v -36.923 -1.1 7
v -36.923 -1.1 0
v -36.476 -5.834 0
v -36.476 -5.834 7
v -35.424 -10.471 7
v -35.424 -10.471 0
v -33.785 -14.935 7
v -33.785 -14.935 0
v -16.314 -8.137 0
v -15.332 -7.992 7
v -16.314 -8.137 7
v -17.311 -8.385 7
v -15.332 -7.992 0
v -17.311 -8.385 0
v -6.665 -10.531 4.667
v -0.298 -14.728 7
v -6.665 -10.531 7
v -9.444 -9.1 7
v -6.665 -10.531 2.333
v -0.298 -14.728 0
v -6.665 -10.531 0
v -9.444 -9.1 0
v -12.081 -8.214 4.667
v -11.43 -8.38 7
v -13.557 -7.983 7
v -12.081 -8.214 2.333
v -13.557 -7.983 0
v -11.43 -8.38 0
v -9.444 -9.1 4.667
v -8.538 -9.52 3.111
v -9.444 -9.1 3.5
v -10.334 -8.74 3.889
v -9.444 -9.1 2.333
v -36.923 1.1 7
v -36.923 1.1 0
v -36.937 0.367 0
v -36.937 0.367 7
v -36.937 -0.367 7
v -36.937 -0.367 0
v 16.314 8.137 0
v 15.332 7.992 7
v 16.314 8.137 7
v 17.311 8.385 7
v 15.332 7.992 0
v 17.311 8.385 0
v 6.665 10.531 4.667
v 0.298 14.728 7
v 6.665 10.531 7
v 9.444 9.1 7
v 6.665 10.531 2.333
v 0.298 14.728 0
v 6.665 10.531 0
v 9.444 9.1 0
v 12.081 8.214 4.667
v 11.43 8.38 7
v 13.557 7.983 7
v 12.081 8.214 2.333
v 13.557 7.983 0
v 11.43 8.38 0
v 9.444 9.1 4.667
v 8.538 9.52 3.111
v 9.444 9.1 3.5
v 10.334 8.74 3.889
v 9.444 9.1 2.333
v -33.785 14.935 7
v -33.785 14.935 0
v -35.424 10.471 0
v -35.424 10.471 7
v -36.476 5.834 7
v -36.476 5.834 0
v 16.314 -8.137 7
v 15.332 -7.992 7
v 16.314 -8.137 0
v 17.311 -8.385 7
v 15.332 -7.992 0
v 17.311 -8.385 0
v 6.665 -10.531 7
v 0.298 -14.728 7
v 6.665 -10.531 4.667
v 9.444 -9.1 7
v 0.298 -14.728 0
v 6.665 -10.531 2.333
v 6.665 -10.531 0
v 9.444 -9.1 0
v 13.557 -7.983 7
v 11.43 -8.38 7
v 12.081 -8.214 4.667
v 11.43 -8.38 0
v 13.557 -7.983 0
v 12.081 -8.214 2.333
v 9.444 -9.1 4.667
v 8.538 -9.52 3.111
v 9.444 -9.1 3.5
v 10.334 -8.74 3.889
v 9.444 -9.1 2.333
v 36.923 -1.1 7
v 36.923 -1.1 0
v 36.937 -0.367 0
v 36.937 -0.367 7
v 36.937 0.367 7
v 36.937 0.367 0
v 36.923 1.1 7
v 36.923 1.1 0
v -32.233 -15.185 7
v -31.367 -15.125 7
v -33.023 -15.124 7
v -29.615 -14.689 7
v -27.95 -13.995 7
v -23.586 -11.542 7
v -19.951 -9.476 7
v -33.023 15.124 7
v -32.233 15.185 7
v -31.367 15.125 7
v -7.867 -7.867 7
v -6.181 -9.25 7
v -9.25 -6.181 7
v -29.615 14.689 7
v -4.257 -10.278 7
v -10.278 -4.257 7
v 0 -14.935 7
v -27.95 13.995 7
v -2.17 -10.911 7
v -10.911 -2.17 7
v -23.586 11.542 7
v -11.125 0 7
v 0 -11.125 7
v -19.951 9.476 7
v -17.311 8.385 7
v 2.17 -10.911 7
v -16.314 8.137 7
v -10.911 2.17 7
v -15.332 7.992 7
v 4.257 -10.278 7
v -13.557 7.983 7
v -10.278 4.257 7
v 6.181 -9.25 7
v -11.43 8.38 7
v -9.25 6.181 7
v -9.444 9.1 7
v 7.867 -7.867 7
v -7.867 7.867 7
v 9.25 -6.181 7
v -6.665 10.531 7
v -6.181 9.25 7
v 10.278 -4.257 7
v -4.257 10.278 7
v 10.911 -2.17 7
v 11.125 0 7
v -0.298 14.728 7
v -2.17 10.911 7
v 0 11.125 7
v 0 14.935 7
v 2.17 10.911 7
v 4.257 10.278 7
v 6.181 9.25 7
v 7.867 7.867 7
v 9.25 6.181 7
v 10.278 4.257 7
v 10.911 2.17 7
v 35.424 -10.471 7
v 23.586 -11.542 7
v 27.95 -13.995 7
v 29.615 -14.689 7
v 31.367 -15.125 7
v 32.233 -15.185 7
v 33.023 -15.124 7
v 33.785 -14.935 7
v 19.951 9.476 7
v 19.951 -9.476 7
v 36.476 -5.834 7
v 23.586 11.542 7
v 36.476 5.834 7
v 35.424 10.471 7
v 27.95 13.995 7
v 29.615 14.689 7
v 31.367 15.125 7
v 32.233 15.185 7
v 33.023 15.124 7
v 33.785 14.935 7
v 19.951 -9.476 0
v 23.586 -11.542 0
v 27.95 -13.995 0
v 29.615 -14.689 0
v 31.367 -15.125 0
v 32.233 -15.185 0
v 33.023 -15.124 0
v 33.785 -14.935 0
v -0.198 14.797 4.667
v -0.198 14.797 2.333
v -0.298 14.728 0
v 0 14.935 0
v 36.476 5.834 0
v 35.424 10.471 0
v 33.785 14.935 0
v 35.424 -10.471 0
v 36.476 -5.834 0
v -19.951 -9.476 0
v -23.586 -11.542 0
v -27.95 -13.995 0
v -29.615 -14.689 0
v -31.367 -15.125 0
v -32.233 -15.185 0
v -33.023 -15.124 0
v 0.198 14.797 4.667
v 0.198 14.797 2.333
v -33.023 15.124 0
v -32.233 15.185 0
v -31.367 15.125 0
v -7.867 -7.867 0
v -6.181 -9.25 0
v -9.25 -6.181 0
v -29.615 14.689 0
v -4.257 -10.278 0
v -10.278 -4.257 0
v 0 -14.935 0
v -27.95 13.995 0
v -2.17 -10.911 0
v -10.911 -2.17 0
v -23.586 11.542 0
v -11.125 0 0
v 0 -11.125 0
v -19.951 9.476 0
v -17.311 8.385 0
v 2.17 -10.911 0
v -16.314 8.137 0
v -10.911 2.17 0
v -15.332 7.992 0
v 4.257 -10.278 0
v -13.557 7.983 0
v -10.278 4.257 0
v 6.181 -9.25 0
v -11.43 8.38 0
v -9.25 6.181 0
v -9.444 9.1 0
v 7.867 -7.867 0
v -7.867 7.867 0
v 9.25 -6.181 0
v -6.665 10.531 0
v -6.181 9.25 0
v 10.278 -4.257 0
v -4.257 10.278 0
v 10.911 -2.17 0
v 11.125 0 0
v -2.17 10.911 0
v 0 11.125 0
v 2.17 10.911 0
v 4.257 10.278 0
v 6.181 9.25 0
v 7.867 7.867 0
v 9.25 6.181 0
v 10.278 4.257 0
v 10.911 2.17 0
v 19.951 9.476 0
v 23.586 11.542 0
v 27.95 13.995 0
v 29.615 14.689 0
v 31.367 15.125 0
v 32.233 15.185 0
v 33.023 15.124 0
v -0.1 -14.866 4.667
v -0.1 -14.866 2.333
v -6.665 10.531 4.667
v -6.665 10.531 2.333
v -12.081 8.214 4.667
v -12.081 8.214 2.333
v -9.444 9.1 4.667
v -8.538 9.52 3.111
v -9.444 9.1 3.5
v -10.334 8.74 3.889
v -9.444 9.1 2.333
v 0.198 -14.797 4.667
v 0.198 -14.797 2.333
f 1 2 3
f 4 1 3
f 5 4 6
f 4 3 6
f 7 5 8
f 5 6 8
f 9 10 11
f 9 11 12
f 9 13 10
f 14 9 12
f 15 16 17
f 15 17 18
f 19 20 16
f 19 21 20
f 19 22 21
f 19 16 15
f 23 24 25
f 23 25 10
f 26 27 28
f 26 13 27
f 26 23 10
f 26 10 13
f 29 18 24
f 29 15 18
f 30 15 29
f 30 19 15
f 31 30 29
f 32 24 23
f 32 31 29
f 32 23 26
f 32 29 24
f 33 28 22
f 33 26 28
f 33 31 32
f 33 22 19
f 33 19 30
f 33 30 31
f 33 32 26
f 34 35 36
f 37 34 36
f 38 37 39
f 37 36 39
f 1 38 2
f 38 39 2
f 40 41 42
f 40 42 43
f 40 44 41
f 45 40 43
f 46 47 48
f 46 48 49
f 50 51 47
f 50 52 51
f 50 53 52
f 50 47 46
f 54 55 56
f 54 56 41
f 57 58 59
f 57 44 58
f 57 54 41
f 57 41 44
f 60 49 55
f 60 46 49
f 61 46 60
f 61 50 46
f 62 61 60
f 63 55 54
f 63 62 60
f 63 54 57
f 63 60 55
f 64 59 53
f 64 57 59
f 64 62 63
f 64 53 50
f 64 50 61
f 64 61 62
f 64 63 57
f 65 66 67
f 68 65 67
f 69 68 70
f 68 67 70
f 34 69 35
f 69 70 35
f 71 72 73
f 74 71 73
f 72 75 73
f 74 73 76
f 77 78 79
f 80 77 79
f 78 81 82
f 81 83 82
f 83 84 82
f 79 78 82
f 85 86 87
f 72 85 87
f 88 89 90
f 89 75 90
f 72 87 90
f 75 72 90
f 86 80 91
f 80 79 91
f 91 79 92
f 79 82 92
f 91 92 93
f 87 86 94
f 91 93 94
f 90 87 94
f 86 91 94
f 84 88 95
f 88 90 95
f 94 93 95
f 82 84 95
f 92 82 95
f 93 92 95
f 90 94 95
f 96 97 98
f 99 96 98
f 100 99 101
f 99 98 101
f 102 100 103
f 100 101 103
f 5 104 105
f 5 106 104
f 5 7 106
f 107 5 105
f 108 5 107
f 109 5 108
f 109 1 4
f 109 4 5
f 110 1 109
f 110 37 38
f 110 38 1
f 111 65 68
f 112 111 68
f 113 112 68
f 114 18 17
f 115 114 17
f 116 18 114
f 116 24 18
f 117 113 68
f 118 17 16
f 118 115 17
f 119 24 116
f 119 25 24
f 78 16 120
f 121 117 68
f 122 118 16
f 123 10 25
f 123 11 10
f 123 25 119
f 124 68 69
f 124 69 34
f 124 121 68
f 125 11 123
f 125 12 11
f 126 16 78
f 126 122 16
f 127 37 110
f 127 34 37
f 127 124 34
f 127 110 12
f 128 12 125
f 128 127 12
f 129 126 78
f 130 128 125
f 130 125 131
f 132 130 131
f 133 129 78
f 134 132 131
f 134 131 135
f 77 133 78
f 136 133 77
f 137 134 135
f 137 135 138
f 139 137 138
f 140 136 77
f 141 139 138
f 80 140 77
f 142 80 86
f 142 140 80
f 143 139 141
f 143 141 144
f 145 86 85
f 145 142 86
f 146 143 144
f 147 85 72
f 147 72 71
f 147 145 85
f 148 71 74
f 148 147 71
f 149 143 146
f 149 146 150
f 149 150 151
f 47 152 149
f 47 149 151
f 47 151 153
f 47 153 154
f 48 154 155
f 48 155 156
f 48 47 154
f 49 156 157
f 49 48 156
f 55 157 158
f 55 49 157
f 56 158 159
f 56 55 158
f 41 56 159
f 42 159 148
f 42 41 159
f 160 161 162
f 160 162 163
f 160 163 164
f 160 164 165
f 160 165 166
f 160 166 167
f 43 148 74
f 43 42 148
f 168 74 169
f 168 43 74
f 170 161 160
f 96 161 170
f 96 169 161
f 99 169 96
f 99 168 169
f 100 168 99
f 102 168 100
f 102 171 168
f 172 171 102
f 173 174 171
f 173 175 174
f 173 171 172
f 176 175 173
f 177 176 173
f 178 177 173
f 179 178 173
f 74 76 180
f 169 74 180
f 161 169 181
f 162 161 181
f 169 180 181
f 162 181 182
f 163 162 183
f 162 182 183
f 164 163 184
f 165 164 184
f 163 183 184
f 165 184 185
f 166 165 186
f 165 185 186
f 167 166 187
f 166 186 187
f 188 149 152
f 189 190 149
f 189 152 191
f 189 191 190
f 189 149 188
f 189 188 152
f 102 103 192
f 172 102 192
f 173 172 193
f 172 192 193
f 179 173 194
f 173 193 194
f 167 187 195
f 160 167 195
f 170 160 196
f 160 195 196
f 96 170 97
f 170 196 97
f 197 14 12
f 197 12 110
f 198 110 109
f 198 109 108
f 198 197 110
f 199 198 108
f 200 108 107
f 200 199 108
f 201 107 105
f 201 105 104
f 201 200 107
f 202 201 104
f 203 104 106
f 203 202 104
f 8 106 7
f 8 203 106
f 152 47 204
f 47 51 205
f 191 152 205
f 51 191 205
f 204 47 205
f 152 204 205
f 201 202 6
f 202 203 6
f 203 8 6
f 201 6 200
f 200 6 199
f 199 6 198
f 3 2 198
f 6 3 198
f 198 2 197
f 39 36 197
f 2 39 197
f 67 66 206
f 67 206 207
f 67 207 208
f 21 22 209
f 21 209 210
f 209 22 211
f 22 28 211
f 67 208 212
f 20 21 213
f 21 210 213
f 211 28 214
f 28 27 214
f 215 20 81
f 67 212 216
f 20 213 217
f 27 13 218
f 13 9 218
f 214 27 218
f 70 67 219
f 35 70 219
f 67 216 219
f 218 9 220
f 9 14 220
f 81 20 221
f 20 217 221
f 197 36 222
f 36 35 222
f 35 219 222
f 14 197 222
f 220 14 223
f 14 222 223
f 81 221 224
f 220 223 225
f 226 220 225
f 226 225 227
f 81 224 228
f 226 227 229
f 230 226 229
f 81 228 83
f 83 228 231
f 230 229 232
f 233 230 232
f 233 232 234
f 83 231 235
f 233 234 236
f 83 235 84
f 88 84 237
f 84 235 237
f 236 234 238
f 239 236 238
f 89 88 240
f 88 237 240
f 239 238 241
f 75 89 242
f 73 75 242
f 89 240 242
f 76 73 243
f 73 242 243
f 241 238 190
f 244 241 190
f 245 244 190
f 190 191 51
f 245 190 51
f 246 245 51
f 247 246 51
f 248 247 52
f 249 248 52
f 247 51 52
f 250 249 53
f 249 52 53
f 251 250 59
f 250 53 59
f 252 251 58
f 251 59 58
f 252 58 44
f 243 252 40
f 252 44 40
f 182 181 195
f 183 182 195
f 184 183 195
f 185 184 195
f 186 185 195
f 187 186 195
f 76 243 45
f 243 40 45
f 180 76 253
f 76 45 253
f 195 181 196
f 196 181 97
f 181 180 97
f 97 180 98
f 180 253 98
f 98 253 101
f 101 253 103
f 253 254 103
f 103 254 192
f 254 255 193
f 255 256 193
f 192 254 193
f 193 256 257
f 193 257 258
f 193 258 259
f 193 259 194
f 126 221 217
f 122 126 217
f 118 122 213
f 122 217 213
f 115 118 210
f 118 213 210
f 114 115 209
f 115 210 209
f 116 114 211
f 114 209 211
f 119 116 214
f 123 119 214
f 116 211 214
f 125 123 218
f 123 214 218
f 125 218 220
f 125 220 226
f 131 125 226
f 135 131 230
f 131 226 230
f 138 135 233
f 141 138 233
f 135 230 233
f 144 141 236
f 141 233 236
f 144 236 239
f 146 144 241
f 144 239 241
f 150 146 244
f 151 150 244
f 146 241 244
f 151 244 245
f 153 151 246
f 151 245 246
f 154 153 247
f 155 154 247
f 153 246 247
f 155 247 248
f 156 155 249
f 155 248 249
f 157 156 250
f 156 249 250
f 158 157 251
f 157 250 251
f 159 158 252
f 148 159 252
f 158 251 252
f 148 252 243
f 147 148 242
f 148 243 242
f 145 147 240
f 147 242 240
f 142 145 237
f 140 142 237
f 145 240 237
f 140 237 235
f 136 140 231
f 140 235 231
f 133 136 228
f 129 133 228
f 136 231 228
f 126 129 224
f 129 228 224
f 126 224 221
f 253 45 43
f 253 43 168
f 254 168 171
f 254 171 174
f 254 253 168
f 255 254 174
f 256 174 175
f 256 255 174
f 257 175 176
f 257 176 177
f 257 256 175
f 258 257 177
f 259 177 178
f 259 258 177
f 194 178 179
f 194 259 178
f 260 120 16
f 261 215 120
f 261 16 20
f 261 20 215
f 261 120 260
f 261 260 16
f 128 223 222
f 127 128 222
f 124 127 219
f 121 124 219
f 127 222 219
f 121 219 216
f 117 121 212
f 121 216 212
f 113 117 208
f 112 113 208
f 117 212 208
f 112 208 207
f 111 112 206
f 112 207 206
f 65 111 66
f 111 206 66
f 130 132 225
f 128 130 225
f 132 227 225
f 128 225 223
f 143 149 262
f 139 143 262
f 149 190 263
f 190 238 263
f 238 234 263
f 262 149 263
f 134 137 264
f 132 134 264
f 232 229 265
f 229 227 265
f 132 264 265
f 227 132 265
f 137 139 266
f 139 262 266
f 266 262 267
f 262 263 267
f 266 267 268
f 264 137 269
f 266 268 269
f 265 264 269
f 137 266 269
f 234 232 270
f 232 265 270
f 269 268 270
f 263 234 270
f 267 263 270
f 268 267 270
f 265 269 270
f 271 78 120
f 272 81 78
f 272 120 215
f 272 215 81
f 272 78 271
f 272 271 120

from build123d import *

# Parameters (mm, degrees)
F1_DEPTH = 7


with BuildPart() as f1:
    # F0 (on Top) → F1 (new body)
    with BuildSketch(Plane.XY):
        with BuildLine():
            ThreePointArc((0, 11.125), (7.8665629407, 7.8665629407), (11.125, 0))
            ThreePointArc((11.125, 0), (7.8665629407, -7.8665629407), (0, -11.125))
            Line((0, -11.125), (0, -14.935))
            add(Edge.make_bspline(
                [(0.2975305523, -14.7281560773), (0.1976224081, -14.7964212888), (0.098439929, -14.8653652618), (0, -14.935)],
                knots=[0.9970613329, 0.9970613329, 0.9970613329, 0.9970613329, 1, 1, 1, 1], degree=3))
            add(Edge.make_bspline(
                [(0.2975305523, -14.7281560773), (7.3951181082, -9.7951650898), (11.9191993362, -6.7662998847), (17.3106230519, -8.3854462868)],
                knots=[0.003112202, 0.003112202, 0.003112202, 0.003112202, 0.226966528, 0.226966528, 0.226966528, 0.226966528], degree=3))
            add(Edge.make_bspline(
                [(36.9228658424, -1.1001812607), (33.3191993332, -4.9864728132), (25.4350438971, -6.457479873), (17.3106230519, -8.3854462868)],
                knots=[0.6774767782, 0.6774767782, 0.6774767782, 0.6774767782, 0.8599164447, 0.8599164447, 0.8599164447, 0.8599164447], degree=3))
            ThreePointArc((36.9228658424, -1.1001812607), (36.9392531167, 0), (36.9228658424, 1.1001812607))
            add(Edge.make_bspline(
                [(36.9228658424, 1.1001812607), (33.3191993332, 4.9864728132), (25.4350438971, 6.457479873), (17.3106230519, 8.3854462868)],
                knots=[0.6774767782, 0.6774767782, 0.6774767782, 0.6774767782, 0.8599164447, 0.8599164447, 0.8599164447, 0.8599164447], degree=3))
            add(Edge.make_bspline(
                [(0.2975305523, 14.7281560773), (7.3951181082, 9.7951650898), (11.9191993362, 6.7662998847), (17.3106230519, 8.3854462868)],
                knots=[0.003112202, 0.003112202, 0.003112202, 0.003112202, 0.226966528, 0.226966528, 0.226966528, 0.226966528], degree=3))
            add(Edge.make_bspline(
                [(0.2975305523, 14.7281560773), (0.1976224081, 14.7964212888), (0.098439929, 14.8653652618), (0, 14.935)],
                knots=[0.9970613329, 0.9970613329, 0.9970613329, 0.9970613329, 1, 1, 1, 1], degree=3))
            Line((0, 14.935), (0, 11.125))
        make_face()
        with BuildLine():
            ThreePointArc((0, -11.125), (-11.125, 0), (0, 11.125))
            Line((0, 11.125), (0, 14.935))
            add(Edge.make_bspline(
                [(-0.2975305523, 14.7281560773), (-0.1976224081, 14.7964212888), (-0.098439929, 14.8653652618), (0, 14.935)],
                knots=[0.9970613329, 0.9970613329, 0.9970613329, 0.9970613329, 1, 1, 1, 1], degree=3))
            add(Edge.make_bspline(
                [(-0.2975305523, 14.7281560773), (-7.3951181082, 9.7951650898), (-11.9191993362, 6.7662998847), (-17.3106230519, 8.3854462868)],
                knots=[0.003112202, 0.003112202, 0.003112202, 0.003112202, 0.226966528, 0.226966528, 0.226966528, 0.226966528], degree=3))
            add(Edge.make_bspline(
                [(-36.9228658424, 1.1001812607), (-33.3191993332, 4.9864728132), (-25.4350438971, 6.457479873), (-17.3106230519, 8.3854462868)],
                knots=[0.6774767782, 0.6774767782, 0.6774767782, 0.6774767782, 0.8599164447, 0.8599164447, 0.8599164447, 0.8599164447], degree=3))
            ThreePointArc((-36.9228658424, 1.1001812607), (-36.9392531167, 0), (-36.9228658424, -1.1001812607))
            add(Edge.make_bspline(
                [(-36.9228658424, -1.1001812607), (-33.3191993332, -4.9864728132), (-25.4350438971, -6.457479873), (-17.3106230519, -8.3854462868)],
                knots=[0.6774767782, 0.6774767782, 0.6774767782, 0.6774767782, 0.8599164447, 0.8599164447, 0.8599164447, 0.8599164447], degree=3))
            add(Edge.make_bspline(
                [(-0.2975305523, -14.7281560773), (-7.3951181082, -9.7951650898), (-11.9191993362, -6.7662998847), (-17.3106230519, -8.3854462868)],
                knots=[0.003112202, 0.003112202, 0.003112202, 0.003112202, 0.226966528, 0.226966528, 0.226966528, 0.226966528], degree=3))
            add(Edge.make_bspline(
                [(-0.2975305523, -14.7281560773), (-0.1976224081, -14.7964212888), (-0.098439929, -14.8653652618), (0, -14.935)],
                knots=[0.9970613329, 0.9970613329, 0.9970613329, 0.9970613329, 1, 1, 1, 1], degree=3))
            Line((0, -14.935), (0, -11.125))
        make_face()
        with BuildLine():
            add(Edge.make_bspline(
                [(0, -14.935), (-0.0996804425, -14.865688897), (-0.1988542112, -14.796738465), (-0.2975305523, -14.7281560773)],
                knots=[0, 0, 0, 0, 0.003112202, 0.003112202, 0.003112202, 0.003112202], degree=3))
            add(Edge.make_bspline(
                [(-0.2975305523, -14.7281560773), (-0.1976224081, -14.7964212888), (-0.098439929, -14.8653652618), (0, -14.935)],
                knots=[0.9970613329, 0.9970613329, 0.9970613329, 0.9970613329, 1, 1, 1, 1], degree=3))
        make_face()
        with BuildLine():
            add(Edge.make_bspline(
                [(-36.9228658424, 1.1001812607), (-33.3191993332, 4.9864728132), (-25.4350438971, 6.457479873), (-17.3106230519, 8.3854462868)],
                knots=[0.6774767782, 0.6774767782, 0.6774767782, 0.6774767782, 0.8599164447, 0.8599164447, 0.8599164447, 0.8599164447], degree=3))
            add(Edge.make_bspline(
                [(-17.3106230519, 8.3854462868), (-17.3759482788, 8.4050646867), (-22.8109780057, 10.0907940795), (-29.1662144452, 16.5153198792), (-33.7854139507, 14.935)],
                knots=[0.226966528, 0.226966528, 0.226966528, 0.226966528, 0.2296788607, 0.4521923767, 0.4521923767, 0.4521923767, 0.4521923767], degree=3))
            ThreePointArc((-33.7854139507, 14.935), (-36.0245160996, 8.1696181434), (-36.9228658424, 1.1001812607))
        make_face()
        with BuildLine():
            add(Edge.make_bspline(
                [(17.3106230519, 8.3854462868), (17.3759482788, 8.4050646867), (22.8109780057, 10.0907940795), (29.1662144452, 16.5153198792), (33.7854139507, 14.935)],
                knots=[0.226966528, 0.226966528, 0.226966528, 0.226966528, 0.2296788607, 0.4521923767, 0.4521923767, 0.4521923767, 0.4521923767], degree=3))
            add(Edge.make_bspline(
                [(36.9228658424, 1.1001812607), (33.3191993332, 4.9864728132), (25.4350438971, 6.457479873), (17.3106230519, 8.3854462868)],
                knots=[0.6774767782, 0.6774767782, 0.6774767782, 0.6774767782, 0.8599164447, 0.8599164447, 0.8599164447, 0.8599164447], degree=3))
            ThreePointArc((36.9228658424, 1.1001812607), (36.0245160996, 8.1696181434), (33.7854139507, 14.935))
        make_face()
        with BuildLine():
            add(Edge.make_bspline(
                [(-17.3106230519, -8.3854462868), (-17.3759482788, -8.4050646867), (-22.8109780057, -10.0907940795), (-29.1662144452, -16.5153198792), (-33.7854139507, -14.935)],
                knots=[0.226966528, 0.226966528, 0.226966528, 0.226966528, 0.2296788607, 0.4521923767, 0.4521923767, 0.4521923767, 0.4521923767], degree=3))
            add(Edge.make_bspline(
                [(-36.9228658424, -1.1001812607), (-33.3191993332, -4.9864728132), (-25.4350438971, -6.457479873), (-17.3106230519, -8.3854462868)],
                knots=[0.6774767782, 0.6774767782, 0.6774767782, 0.6774767782, 0.8599164447, 0.8599164447, 0.8599164447, 0.8599164447], degree=3))
            ThreePointArc((-36.9228658424, -1.1001812607), (-36.0245160996, -8.1696181434), (-33.7854139507, -14.935))
        make_face()
        with BuildLine():
            add(Edge.make_bspline(
                [(36.9228658424, -1.1001812607), (33.3191993332, -4.9864728132), (25.4350438971, -6.457479873), (17.3106230519, -8.3854462868)],
                knots=[0.6774767782, 0.6774767782, 0.6774767782, 0.6774767782, 0.8599164447, 0.8599164447, 0.8599164447, 0.8599164447], degree=3))
            add(Edge.make_bspline(
                [(17.3106230519, -8.3854462868), (17.3759482788, -8.4050646867), (22.8109780057, -10.0907940795), (29.1662144452, -16.5153198792), (33.7854139507, -14.935)],
                knots=[0.226966528, 0.226966528, 0.226966528, 0.226966528, 0.2296788607, 0.4521923767, 0.4521923767, 0.4521923767, 0.4521923767], degree=3))
            ThreePointArc((33.7854139507, -14.935), (36.0245160996, -8.1696181434), (36.9228658424, -1.1001812607))
        make_face()
    extrude(amount=F1_DEPTH)


solid = f1.part
